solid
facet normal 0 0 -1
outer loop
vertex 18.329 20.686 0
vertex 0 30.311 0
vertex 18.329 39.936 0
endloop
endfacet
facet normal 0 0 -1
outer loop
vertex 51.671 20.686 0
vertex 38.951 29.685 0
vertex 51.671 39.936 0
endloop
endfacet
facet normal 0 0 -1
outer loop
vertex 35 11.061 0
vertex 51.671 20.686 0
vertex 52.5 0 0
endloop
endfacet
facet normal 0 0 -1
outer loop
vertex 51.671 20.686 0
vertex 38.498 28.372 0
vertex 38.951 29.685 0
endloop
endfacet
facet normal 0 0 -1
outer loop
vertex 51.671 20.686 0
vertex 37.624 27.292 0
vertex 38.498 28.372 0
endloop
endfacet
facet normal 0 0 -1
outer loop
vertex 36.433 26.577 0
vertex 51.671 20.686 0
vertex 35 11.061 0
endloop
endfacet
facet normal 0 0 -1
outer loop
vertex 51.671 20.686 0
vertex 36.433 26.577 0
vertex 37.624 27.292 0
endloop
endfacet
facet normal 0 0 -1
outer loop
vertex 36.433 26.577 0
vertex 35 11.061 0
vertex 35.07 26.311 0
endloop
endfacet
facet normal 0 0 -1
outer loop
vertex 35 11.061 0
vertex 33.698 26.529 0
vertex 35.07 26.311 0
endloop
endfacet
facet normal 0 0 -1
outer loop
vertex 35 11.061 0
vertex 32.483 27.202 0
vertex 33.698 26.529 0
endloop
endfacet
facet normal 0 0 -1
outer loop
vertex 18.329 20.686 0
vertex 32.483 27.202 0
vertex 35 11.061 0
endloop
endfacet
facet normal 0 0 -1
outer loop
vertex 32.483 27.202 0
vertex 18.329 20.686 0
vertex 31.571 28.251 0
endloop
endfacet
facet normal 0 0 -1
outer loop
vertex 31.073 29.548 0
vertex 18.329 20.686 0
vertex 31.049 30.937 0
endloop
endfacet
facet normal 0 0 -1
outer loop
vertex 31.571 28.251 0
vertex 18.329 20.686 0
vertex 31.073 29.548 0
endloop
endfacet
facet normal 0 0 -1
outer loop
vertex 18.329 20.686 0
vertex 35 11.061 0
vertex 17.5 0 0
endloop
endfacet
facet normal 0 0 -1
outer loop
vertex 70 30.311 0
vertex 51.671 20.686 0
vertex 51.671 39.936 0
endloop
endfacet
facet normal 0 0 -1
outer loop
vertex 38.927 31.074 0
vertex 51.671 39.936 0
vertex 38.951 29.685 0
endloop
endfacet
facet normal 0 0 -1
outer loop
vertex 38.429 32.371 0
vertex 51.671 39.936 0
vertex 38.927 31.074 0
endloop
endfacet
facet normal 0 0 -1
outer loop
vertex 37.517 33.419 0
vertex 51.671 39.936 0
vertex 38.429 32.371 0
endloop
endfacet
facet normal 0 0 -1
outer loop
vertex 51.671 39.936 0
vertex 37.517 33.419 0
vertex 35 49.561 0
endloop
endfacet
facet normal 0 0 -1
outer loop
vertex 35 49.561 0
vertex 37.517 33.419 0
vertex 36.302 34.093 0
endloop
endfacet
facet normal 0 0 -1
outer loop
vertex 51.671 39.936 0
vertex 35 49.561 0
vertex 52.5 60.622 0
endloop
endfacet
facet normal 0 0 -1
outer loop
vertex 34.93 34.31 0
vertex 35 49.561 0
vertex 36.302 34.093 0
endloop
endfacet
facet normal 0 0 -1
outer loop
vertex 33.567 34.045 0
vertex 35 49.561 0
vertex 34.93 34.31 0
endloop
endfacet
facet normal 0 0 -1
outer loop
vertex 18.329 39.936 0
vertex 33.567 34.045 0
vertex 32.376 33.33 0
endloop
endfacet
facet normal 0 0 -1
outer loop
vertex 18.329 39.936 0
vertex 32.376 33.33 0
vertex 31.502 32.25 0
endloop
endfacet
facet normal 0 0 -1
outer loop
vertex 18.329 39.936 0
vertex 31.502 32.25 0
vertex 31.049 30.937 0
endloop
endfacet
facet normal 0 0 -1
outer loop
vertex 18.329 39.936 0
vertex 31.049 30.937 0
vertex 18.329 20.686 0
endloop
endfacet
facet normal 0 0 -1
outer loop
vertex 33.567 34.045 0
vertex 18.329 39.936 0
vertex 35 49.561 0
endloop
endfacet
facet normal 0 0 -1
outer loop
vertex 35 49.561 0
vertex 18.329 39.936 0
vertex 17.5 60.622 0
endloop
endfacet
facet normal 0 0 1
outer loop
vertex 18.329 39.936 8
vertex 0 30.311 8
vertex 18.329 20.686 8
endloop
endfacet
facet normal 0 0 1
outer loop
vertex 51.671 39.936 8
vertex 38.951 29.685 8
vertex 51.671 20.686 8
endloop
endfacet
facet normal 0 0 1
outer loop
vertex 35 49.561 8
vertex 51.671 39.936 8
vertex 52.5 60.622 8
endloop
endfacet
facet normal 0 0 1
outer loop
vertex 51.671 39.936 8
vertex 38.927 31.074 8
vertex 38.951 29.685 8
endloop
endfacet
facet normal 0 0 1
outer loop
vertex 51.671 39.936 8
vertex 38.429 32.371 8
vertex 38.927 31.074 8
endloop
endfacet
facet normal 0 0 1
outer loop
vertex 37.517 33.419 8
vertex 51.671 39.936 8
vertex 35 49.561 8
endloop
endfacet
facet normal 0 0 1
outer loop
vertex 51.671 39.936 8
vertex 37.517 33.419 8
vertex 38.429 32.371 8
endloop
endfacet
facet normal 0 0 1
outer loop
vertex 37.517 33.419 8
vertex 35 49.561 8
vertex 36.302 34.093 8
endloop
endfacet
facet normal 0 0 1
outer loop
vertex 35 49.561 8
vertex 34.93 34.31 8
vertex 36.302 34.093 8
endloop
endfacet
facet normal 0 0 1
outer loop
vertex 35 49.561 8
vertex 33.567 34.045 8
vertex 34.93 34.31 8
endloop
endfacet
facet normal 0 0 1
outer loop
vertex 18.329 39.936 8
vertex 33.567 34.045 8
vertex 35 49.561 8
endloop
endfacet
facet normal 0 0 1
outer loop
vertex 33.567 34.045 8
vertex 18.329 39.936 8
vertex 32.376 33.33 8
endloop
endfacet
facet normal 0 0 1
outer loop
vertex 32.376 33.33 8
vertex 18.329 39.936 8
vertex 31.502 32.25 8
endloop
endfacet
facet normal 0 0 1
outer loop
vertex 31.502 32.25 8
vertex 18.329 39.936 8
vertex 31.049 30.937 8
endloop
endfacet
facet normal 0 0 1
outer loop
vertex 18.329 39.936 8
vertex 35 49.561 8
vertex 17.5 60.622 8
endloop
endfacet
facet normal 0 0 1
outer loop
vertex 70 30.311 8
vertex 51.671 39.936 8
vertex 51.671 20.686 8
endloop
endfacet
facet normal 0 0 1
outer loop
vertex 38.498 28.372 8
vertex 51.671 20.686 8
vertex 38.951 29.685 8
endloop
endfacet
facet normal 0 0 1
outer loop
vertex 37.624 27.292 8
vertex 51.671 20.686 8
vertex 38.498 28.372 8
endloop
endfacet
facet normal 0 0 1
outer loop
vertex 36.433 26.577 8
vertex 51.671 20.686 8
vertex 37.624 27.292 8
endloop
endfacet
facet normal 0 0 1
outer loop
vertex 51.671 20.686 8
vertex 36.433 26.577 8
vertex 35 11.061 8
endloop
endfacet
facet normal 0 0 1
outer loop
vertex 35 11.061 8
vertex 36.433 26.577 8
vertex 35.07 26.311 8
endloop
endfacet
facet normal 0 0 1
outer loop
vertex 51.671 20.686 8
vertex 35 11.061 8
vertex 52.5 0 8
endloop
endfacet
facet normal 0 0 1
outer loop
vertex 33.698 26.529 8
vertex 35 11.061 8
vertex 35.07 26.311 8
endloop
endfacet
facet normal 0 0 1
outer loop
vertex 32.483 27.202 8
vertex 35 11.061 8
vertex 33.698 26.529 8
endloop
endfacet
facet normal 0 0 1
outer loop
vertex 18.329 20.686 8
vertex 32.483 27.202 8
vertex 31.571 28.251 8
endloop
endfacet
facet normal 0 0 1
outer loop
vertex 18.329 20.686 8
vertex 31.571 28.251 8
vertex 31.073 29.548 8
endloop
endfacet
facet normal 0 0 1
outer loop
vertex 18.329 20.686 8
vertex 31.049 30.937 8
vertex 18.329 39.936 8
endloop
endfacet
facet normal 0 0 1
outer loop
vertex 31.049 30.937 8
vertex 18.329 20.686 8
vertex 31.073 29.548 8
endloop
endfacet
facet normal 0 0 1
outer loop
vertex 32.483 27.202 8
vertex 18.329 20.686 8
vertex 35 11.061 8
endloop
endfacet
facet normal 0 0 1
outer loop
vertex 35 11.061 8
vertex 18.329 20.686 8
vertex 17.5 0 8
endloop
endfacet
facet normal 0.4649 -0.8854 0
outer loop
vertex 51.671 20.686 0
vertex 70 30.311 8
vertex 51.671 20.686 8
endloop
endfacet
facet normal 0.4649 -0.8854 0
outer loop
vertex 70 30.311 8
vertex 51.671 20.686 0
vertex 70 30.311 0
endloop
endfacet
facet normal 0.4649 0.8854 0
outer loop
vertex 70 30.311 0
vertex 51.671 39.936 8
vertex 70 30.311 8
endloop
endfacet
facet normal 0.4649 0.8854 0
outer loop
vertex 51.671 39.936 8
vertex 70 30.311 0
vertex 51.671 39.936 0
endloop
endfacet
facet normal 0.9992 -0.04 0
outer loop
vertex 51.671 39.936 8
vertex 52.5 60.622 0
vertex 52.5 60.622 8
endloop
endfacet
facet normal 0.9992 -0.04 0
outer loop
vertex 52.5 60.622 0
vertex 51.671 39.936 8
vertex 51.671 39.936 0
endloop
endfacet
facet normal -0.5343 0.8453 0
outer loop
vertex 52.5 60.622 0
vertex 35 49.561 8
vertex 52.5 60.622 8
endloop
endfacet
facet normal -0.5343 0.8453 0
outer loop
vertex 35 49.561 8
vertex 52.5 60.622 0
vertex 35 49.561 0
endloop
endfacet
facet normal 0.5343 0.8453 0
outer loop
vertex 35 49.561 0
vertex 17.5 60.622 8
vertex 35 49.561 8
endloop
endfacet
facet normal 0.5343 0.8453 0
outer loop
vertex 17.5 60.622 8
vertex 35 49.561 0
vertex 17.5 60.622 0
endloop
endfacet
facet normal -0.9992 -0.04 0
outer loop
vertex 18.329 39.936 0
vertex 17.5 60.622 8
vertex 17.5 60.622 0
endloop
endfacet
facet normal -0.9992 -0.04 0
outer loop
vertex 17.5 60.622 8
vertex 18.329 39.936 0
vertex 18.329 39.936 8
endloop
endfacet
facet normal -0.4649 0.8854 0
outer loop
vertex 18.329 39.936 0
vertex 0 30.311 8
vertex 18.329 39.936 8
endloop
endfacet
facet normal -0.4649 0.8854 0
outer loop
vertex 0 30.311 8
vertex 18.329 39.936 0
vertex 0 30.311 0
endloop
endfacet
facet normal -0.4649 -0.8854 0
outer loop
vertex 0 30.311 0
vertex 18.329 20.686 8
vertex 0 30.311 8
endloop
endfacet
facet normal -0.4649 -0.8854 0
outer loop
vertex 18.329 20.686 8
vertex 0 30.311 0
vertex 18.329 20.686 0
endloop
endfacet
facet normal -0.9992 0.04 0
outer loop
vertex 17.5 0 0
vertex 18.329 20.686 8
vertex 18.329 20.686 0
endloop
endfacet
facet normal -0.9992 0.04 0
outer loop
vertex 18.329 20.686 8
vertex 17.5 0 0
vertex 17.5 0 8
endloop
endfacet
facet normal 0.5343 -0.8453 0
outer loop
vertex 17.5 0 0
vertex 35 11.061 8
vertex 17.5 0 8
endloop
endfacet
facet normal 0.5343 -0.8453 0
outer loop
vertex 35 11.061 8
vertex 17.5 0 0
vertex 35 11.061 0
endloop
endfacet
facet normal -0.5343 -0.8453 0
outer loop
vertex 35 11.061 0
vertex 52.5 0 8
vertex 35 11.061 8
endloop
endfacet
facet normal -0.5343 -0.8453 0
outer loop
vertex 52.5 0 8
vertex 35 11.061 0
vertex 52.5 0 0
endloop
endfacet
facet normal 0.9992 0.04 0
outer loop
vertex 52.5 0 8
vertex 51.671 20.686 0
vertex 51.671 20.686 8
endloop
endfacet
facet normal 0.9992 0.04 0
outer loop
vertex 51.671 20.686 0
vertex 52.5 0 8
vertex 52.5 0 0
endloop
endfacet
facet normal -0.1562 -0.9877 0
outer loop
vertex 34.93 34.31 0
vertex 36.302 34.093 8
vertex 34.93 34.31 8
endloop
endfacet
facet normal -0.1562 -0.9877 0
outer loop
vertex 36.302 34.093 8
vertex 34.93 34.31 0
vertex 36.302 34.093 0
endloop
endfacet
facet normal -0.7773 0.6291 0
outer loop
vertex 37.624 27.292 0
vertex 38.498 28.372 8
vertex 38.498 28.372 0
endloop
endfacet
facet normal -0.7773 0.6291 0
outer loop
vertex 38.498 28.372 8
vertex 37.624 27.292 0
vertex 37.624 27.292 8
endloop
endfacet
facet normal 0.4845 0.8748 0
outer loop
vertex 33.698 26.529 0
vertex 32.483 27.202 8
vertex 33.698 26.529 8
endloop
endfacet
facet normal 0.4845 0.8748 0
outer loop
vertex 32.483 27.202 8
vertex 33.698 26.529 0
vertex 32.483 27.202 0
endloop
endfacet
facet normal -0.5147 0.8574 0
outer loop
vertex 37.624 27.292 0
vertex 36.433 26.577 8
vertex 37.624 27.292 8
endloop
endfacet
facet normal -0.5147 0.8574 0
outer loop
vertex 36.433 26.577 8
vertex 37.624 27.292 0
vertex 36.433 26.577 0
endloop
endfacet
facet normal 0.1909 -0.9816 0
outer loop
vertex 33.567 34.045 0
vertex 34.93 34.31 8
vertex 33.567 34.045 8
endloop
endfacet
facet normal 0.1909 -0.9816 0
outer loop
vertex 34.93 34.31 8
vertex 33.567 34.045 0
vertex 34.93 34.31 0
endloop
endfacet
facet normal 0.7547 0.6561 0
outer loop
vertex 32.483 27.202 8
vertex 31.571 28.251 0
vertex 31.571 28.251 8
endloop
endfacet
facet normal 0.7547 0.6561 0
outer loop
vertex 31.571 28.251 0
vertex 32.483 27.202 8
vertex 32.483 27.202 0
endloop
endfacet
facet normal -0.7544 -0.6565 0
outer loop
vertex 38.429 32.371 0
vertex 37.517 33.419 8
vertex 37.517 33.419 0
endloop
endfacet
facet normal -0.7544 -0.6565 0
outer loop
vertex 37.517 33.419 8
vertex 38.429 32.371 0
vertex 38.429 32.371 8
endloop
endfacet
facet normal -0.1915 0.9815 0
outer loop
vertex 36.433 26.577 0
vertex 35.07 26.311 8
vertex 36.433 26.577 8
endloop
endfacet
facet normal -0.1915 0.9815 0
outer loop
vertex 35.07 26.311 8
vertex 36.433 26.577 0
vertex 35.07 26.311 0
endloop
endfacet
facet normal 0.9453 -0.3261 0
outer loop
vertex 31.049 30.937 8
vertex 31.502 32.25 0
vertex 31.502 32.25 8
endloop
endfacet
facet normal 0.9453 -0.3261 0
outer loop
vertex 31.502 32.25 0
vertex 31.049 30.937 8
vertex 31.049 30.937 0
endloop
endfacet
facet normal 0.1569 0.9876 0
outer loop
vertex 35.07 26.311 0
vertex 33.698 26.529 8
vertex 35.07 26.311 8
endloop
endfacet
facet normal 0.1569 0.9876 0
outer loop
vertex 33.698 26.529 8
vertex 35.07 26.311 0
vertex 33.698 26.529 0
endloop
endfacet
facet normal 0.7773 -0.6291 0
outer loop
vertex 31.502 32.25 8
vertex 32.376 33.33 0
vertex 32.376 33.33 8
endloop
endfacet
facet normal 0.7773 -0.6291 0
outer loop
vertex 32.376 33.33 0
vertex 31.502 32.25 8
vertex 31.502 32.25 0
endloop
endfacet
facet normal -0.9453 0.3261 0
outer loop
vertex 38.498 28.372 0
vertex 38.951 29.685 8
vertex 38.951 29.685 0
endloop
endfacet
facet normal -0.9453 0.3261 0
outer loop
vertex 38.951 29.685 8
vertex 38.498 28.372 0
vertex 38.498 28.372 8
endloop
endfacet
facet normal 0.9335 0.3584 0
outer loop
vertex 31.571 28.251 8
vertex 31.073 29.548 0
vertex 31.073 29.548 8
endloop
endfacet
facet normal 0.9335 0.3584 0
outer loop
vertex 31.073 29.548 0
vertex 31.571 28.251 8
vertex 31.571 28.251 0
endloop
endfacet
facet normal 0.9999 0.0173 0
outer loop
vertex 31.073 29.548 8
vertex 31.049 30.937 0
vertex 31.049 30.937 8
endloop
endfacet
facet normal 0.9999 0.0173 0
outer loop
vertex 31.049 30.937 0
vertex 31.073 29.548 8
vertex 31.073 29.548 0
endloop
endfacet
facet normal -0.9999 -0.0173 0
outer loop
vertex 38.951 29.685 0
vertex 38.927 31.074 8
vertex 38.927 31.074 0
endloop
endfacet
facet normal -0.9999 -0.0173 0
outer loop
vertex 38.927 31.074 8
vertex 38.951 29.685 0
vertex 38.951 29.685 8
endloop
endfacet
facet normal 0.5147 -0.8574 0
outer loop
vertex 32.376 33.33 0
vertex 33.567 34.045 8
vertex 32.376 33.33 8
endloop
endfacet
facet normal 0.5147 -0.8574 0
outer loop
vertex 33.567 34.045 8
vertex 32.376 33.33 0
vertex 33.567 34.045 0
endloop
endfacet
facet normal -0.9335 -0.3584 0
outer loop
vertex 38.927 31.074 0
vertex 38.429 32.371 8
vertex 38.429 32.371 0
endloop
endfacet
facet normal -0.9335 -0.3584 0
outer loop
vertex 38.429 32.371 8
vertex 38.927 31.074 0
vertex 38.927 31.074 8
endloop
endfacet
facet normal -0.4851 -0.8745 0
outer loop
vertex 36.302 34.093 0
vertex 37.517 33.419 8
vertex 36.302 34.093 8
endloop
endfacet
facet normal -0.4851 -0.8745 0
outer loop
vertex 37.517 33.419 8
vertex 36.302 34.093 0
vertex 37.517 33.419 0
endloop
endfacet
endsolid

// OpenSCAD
$fn = 32;

// ----------------------------------------------------------------------
// Star wheel: 6-point star, R35
// ----------------------------------------------------------------------

// --- parameters (mm) ---
n_points = 6;             // number of points / teeth
r_out = 35;               // tip radius
r_in = 19.25;             // root radius
bore_r = 4;               // centre bore radius
plate_t = 8;              // plate thickness, Z (extrusion height)
bore_d = 8;               // centre bore diameter

profile = [[70, 30.311], [51.671, 39.936], [52.5, 60.622], [35, 49.561], [17.5, 60.622], [18.329, 39.936], [0, 30.311], [18.329, 20.686], [17.5, 0], [35, 11.061], [52.5, 0], [51.671, 20.686]];  // primary outline, 12 points, counter clockwise
void_1 = [[38.927, 31.074], [38.429, 32.371], [37.517, 33.419], [36.302, 34.093], [34.93, 34.31], [33.567, 34.045], [32.376, 33.33], [31.502, 32.25], [31.049, 30.937], [31.073, 29.548], [31.571, 28.251], [32.483, 27.202], [33.698, 26.529], [35.07, 26.311], [36.433, 26.577], [37.624, 27.292], [38.498, 28.372], [38.951, 29.685]];  // centre bore, 18 points

// --- the one profile operation ---
difference() {
  linear_extrude(height = plate_t) polygon(points = profile);
  translate([0, 0, -1])
    linear_extrude(height = plate_t + 2) polygon(points = void_1);
}
